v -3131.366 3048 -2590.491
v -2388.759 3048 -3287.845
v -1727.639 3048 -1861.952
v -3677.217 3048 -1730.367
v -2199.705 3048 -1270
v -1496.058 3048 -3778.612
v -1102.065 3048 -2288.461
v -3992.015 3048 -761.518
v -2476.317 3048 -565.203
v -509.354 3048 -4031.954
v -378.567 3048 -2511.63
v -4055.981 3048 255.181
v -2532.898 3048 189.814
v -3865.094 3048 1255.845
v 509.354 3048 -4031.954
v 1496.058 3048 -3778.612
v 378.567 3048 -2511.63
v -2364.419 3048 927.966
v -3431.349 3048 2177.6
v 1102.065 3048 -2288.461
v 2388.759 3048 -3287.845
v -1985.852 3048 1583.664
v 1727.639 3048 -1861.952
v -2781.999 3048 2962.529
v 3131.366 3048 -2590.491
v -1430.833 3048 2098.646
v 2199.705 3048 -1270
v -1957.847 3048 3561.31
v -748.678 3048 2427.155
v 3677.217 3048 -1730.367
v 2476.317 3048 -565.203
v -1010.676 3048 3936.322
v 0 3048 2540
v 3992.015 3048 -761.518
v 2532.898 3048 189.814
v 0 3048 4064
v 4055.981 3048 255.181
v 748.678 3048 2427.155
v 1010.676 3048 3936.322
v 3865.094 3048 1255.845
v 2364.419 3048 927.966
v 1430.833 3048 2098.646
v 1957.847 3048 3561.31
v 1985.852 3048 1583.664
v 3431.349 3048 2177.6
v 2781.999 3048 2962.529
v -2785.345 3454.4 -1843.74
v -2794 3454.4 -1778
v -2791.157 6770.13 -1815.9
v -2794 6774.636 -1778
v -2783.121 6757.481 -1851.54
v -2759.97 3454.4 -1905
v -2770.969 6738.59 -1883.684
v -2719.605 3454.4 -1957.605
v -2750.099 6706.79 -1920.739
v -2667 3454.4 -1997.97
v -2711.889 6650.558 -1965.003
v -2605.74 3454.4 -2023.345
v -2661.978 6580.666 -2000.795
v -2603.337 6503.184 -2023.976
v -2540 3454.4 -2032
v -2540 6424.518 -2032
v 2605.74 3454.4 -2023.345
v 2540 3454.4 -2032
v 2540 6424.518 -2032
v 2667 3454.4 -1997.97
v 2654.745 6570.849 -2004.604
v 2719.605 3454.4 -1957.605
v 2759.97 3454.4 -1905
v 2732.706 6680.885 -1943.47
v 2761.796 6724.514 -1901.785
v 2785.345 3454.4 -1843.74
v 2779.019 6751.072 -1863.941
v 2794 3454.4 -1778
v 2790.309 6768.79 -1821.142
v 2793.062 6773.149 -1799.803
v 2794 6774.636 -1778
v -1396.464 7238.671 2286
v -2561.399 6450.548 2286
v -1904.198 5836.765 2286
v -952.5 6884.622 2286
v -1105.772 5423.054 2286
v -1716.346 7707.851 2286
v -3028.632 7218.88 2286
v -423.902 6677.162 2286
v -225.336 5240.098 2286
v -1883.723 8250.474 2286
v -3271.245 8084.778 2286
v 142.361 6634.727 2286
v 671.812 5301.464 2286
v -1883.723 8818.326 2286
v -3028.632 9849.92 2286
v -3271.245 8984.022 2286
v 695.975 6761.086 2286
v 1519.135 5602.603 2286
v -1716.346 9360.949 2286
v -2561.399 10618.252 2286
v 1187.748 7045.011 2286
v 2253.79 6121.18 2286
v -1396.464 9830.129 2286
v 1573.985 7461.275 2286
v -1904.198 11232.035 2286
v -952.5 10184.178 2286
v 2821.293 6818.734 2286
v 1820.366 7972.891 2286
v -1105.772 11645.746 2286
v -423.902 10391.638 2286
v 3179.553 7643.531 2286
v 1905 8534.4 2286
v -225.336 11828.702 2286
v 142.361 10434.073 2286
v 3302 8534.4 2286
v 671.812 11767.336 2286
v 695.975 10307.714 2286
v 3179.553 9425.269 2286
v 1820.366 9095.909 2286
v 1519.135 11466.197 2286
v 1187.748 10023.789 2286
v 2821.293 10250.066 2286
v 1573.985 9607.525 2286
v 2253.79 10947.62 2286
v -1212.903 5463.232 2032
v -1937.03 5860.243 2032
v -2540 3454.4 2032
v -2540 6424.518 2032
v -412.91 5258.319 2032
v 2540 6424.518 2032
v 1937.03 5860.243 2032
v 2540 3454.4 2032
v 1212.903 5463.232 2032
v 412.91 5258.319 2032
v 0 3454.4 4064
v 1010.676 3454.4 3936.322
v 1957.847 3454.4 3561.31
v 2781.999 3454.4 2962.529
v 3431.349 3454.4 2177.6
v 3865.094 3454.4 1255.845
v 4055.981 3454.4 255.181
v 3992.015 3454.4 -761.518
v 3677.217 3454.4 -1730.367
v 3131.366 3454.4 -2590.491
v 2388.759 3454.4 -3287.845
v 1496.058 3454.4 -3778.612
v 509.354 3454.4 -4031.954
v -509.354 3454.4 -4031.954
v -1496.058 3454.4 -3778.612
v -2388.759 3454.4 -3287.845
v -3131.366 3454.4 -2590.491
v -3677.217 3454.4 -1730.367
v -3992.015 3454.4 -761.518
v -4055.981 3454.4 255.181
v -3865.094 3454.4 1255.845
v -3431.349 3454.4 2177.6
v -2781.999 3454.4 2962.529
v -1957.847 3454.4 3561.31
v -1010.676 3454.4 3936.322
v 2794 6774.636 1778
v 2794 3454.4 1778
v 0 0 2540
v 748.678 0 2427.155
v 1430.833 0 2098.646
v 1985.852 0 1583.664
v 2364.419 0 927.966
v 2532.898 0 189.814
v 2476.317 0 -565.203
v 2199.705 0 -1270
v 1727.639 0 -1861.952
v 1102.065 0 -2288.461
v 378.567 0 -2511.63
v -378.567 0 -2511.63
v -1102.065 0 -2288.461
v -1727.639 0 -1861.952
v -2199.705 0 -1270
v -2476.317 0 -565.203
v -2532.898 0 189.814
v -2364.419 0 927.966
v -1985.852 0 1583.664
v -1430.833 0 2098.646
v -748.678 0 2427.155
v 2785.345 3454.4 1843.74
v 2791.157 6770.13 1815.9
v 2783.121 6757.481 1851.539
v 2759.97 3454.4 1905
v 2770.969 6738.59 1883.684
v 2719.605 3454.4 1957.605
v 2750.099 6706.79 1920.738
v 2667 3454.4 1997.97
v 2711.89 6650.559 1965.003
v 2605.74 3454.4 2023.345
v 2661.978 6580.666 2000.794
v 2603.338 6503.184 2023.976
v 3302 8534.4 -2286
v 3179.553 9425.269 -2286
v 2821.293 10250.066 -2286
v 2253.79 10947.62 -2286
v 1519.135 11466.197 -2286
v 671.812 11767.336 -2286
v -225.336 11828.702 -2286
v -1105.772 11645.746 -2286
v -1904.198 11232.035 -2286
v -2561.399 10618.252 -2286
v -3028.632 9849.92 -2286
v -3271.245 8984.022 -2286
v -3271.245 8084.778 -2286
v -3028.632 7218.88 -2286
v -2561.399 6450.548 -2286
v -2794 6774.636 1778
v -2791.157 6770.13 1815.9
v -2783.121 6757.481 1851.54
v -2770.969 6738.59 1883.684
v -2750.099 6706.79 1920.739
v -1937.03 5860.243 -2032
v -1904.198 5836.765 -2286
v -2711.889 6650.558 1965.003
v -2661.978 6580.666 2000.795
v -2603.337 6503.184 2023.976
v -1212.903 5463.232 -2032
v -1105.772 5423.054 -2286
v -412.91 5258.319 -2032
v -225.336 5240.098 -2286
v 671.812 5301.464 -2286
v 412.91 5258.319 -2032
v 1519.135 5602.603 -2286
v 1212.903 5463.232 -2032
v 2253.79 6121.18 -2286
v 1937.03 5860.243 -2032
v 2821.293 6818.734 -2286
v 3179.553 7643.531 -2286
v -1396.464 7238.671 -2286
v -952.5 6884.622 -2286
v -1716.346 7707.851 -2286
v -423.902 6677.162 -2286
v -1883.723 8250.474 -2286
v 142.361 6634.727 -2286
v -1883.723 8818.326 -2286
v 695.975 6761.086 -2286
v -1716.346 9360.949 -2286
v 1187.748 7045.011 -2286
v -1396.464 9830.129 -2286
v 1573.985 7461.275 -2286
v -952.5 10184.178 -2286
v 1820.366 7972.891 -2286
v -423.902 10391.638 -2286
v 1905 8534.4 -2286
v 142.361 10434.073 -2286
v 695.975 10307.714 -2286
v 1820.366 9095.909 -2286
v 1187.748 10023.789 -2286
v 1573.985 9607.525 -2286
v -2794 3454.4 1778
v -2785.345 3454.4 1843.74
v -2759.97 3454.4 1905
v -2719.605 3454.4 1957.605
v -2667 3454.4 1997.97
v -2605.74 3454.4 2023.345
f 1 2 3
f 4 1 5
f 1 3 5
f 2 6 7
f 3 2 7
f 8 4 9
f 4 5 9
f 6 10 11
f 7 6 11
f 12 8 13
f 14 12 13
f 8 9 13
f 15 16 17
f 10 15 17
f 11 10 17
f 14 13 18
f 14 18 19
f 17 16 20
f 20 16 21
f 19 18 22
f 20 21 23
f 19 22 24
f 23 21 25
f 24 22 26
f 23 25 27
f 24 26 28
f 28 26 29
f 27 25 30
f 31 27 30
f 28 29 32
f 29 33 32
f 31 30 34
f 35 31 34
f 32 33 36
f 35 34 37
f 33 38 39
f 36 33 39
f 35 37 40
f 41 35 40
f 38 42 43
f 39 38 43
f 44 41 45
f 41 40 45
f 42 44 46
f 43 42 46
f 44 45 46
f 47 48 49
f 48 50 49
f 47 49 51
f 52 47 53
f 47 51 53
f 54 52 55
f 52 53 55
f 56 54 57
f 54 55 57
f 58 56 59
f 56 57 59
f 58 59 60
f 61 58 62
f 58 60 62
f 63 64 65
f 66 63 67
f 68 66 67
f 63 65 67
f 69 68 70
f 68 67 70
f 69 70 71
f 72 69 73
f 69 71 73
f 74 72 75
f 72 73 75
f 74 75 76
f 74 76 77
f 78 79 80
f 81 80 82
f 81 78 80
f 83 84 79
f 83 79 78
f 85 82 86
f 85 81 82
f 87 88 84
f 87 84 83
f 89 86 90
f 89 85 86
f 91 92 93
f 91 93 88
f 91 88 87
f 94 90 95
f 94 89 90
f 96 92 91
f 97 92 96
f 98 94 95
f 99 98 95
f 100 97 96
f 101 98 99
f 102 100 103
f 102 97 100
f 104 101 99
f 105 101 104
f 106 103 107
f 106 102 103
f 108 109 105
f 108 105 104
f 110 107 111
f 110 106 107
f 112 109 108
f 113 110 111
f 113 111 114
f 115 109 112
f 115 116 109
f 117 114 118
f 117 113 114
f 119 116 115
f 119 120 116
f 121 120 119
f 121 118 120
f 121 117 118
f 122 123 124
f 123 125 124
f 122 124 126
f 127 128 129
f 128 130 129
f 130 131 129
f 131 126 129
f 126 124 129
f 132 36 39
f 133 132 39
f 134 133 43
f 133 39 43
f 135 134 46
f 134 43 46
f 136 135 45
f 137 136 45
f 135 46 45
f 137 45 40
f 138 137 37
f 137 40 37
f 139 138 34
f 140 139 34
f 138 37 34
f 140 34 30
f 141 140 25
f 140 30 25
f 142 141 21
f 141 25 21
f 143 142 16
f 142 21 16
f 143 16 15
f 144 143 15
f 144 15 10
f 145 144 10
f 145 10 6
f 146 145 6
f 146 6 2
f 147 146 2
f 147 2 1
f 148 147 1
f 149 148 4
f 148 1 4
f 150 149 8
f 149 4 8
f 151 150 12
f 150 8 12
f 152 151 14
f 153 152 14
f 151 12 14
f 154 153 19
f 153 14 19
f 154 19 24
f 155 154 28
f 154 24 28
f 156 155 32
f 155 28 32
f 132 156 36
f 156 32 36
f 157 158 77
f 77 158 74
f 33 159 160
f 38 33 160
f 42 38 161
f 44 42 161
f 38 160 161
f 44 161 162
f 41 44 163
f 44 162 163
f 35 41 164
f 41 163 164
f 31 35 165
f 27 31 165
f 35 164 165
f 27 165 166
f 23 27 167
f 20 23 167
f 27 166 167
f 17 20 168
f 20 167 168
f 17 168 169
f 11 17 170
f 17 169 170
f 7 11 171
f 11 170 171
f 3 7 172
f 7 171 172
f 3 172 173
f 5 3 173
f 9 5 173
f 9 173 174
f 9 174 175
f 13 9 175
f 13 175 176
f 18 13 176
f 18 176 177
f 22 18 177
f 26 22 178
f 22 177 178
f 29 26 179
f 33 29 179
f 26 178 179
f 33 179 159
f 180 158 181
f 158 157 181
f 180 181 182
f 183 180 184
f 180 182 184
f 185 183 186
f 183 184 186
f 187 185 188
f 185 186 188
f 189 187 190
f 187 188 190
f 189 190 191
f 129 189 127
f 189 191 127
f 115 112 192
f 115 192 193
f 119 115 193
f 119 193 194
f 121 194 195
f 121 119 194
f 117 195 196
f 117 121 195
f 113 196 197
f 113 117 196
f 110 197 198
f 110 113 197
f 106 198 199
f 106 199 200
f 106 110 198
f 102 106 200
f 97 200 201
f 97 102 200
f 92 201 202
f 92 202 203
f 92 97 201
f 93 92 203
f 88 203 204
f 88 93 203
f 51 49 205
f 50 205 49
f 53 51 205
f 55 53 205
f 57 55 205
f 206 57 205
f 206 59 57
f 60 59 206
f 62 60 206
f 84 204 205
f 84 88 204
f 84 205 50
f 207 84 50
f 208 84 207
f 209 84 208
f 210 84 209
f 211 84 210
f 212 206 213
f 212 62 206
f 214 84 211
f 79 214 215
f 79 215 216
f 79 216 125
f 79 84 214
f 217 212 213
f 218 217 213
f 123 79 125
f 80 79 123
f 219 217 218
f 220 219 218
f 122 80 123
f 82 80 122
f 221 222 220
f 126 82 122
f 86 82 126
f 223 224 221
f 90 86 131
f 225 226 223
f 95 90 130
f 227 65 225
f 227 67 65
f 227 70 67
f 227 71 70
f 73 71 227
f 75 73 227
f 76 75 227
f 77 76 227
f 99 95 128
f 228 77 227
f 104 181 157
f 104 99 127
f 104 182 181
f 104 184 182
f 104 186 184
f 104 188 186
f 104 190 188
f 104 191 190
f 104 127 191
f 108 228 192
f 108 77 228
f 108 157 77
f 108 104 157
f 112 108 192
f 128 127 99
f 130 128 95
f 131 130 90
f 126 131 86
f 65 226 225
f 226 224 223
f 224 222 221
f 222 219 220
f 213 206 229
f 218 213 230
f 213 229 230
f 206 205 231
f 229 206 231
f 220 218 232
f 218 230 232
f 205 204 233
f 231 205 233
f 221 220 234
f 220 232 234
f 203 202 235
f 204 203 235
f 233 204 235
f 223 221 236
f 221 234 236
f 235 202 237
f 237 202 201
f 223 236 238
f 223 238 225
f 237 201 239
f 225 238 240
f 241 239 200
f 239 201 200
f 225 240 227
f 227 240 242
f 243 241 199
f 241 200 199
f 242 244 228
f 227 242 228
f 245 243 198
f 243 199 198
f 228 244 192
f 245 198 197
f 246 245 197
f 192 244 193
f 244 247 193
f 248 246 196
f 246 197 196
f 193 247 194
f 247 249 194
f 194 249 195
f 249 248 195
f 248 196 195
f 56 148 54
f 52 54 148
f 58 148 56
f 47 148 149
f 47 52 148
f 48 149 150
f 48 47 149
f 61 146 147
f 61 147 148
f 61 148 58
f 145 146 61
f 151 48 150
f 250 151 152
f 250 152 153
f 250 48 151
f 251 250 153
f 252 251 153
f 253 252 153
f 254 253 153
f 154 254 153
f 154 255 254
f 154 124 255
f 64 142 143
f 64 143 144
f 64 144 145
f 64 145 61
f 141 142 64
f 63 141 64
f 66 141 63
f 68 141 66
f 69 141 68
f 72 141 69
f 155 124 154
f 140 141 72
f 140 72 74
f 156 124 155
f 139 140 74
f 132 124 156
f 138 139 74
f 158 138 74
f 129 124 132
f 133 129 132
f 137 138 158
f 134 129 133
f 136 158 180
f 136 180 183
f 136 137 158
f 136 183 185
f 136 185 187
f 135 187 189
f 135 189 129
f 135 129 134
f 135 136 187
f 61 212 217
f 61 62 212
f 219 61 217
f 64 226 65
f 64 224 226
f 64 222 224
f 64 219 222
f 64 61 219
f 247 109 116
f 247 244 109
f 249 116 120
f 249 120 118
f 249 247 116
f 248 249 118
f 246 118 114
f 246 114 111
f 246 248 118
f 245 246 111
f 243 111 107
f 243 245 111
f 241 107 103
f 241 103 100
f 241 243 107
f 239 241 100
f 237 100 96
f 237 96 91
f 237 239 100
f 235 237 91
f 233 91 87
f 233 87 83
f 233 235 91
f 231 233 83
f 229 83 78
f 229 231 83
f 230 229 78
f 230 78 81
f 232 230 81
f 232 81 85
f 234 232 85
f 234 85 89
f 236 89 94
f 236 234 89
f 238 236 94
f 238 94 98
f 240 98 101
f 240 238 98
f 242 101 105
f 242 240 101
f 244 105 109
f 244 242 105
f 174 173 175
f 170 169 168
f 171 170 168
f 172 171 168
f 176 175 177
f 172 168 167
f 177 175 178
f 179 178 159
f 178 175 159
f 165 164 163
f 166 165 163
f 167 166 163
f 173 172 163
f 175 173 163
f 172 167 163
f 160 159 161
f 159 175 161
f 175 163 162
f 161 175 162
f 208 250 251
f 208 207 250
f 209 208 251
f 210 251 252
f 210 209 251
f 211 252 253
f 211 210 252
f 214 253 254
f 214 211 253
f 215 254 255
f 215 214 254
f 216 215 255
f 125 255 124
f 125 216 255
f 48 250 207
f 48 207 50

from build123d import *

# Parameters (mm, degrees)
SKETCH1_R                = 2540
BOSS_EXTRUDE1_DEPTH      = 3048
SKETCH2_R                = 4064
BOSS_EXTRUDE2_DEPTH      = 406.4
SKETCH3_R                = 3302
SKETCH3_R_2              = 1905
BOSS_EXTRUDE3_DEPTH      = 2286
BOSS_EXTRUDE4_REACH      = 10165.175
BOSS_EXTRUDE4_END_RADIUS = 3302
SKETCH4_W                = 5588
SKETCH4_H                = 4064
FILLET1_R                = 254


with BuildPart() as part:
    # Sketch1 → Boss-Extrude1 (new body)
    with BuildSketch(Plane(origin=(0, 0, 0), x_dir=(1, 0, 0), z_dir=(0, 1, 0))):
        with Locations(Location((0, 0, 0), (0, 0, 270))):
            Circle(SKETCH1_R)
    extrude(amount=BOSS_EXTRUDE1_DEPTH)

    # Sketch2 → Boss-Extrude2 (add)
    with BuildSketch(Plane(origin=(0, 3048, 0), x_dir=(1, 0, 0), z_dir=(0, 1, 0))):
        with Locations(Location((0, 0, 0), (0, 0, 270))):
            Circle(SKETCH2_R)
    extrude(amount=BOSS_EXTRUDE2_DEPTH)



with BuildPart() as body_2:
    # Sketch3 → Boss-Extrude3 (new, symmetric)
    with BuildSketch(Plane.XY):
        with Locations((0, 8534.4)):
            Circle(SKETCH3_R)
        with Locations((0, 8534.4)):
            Circle(SKETCH3_R_2, mode=Mode.SUBTRACT)
    extrude(amount=BOSS_EXTRUDE3_DEPTH, both=True)


with BuildPart() as part_1:
    add(part.part)

    add(body_2.part)  # Boss-Extrude4 merges body 2
    # Boss-Extrude4: up to this cylinder (the profile starts outside it)
    boss_extrude4_end = Plane(origin=(0, 8534.4, 0), z_dir=(0, 0, -1)) * Cylinder(BOSS_EXTRUDE4_END_RADIUS, 26935.35, mode=Mode.PRIVATE)
    # Sketch4 → Boss-Extrude4 (add, up to the surface)
    with BuildSketch(Plane(origin=(0, 3454.4, 0), x_dir=(1, 0, 0), z_dir=(0, 1, 0)), mode=Mode.PRIVATE) as boss_extrude4_sk1:
        Rectangle(SKETCH4_W, SKETCH4_H)
    boss_extrude4_tool1 = extrude(boss_extrude4_sk1.sketch, amount=BOSS_EXTRUDE4_REACH, mode=Mode.PRIVATE) - boss_extrude4_end
    add(boss_extrude4_tool1.solids().sort_by_distance((0, 3454.4, 0))[0])

    # Fillet1
    fillet1_edges = [part_1.edges().sort_by_distance(p)[0] for p in [
        (-2794, 5114.518189755, 2032),
        (-2794, 5114.518189755, -2032),
        (2794, 5114.518189755, 2032),
        (2794, 5114.518189755, -2032),
    ]]
    fillet(fillet1_edges, radius=FILLET1_R)


solid = part_1.part
